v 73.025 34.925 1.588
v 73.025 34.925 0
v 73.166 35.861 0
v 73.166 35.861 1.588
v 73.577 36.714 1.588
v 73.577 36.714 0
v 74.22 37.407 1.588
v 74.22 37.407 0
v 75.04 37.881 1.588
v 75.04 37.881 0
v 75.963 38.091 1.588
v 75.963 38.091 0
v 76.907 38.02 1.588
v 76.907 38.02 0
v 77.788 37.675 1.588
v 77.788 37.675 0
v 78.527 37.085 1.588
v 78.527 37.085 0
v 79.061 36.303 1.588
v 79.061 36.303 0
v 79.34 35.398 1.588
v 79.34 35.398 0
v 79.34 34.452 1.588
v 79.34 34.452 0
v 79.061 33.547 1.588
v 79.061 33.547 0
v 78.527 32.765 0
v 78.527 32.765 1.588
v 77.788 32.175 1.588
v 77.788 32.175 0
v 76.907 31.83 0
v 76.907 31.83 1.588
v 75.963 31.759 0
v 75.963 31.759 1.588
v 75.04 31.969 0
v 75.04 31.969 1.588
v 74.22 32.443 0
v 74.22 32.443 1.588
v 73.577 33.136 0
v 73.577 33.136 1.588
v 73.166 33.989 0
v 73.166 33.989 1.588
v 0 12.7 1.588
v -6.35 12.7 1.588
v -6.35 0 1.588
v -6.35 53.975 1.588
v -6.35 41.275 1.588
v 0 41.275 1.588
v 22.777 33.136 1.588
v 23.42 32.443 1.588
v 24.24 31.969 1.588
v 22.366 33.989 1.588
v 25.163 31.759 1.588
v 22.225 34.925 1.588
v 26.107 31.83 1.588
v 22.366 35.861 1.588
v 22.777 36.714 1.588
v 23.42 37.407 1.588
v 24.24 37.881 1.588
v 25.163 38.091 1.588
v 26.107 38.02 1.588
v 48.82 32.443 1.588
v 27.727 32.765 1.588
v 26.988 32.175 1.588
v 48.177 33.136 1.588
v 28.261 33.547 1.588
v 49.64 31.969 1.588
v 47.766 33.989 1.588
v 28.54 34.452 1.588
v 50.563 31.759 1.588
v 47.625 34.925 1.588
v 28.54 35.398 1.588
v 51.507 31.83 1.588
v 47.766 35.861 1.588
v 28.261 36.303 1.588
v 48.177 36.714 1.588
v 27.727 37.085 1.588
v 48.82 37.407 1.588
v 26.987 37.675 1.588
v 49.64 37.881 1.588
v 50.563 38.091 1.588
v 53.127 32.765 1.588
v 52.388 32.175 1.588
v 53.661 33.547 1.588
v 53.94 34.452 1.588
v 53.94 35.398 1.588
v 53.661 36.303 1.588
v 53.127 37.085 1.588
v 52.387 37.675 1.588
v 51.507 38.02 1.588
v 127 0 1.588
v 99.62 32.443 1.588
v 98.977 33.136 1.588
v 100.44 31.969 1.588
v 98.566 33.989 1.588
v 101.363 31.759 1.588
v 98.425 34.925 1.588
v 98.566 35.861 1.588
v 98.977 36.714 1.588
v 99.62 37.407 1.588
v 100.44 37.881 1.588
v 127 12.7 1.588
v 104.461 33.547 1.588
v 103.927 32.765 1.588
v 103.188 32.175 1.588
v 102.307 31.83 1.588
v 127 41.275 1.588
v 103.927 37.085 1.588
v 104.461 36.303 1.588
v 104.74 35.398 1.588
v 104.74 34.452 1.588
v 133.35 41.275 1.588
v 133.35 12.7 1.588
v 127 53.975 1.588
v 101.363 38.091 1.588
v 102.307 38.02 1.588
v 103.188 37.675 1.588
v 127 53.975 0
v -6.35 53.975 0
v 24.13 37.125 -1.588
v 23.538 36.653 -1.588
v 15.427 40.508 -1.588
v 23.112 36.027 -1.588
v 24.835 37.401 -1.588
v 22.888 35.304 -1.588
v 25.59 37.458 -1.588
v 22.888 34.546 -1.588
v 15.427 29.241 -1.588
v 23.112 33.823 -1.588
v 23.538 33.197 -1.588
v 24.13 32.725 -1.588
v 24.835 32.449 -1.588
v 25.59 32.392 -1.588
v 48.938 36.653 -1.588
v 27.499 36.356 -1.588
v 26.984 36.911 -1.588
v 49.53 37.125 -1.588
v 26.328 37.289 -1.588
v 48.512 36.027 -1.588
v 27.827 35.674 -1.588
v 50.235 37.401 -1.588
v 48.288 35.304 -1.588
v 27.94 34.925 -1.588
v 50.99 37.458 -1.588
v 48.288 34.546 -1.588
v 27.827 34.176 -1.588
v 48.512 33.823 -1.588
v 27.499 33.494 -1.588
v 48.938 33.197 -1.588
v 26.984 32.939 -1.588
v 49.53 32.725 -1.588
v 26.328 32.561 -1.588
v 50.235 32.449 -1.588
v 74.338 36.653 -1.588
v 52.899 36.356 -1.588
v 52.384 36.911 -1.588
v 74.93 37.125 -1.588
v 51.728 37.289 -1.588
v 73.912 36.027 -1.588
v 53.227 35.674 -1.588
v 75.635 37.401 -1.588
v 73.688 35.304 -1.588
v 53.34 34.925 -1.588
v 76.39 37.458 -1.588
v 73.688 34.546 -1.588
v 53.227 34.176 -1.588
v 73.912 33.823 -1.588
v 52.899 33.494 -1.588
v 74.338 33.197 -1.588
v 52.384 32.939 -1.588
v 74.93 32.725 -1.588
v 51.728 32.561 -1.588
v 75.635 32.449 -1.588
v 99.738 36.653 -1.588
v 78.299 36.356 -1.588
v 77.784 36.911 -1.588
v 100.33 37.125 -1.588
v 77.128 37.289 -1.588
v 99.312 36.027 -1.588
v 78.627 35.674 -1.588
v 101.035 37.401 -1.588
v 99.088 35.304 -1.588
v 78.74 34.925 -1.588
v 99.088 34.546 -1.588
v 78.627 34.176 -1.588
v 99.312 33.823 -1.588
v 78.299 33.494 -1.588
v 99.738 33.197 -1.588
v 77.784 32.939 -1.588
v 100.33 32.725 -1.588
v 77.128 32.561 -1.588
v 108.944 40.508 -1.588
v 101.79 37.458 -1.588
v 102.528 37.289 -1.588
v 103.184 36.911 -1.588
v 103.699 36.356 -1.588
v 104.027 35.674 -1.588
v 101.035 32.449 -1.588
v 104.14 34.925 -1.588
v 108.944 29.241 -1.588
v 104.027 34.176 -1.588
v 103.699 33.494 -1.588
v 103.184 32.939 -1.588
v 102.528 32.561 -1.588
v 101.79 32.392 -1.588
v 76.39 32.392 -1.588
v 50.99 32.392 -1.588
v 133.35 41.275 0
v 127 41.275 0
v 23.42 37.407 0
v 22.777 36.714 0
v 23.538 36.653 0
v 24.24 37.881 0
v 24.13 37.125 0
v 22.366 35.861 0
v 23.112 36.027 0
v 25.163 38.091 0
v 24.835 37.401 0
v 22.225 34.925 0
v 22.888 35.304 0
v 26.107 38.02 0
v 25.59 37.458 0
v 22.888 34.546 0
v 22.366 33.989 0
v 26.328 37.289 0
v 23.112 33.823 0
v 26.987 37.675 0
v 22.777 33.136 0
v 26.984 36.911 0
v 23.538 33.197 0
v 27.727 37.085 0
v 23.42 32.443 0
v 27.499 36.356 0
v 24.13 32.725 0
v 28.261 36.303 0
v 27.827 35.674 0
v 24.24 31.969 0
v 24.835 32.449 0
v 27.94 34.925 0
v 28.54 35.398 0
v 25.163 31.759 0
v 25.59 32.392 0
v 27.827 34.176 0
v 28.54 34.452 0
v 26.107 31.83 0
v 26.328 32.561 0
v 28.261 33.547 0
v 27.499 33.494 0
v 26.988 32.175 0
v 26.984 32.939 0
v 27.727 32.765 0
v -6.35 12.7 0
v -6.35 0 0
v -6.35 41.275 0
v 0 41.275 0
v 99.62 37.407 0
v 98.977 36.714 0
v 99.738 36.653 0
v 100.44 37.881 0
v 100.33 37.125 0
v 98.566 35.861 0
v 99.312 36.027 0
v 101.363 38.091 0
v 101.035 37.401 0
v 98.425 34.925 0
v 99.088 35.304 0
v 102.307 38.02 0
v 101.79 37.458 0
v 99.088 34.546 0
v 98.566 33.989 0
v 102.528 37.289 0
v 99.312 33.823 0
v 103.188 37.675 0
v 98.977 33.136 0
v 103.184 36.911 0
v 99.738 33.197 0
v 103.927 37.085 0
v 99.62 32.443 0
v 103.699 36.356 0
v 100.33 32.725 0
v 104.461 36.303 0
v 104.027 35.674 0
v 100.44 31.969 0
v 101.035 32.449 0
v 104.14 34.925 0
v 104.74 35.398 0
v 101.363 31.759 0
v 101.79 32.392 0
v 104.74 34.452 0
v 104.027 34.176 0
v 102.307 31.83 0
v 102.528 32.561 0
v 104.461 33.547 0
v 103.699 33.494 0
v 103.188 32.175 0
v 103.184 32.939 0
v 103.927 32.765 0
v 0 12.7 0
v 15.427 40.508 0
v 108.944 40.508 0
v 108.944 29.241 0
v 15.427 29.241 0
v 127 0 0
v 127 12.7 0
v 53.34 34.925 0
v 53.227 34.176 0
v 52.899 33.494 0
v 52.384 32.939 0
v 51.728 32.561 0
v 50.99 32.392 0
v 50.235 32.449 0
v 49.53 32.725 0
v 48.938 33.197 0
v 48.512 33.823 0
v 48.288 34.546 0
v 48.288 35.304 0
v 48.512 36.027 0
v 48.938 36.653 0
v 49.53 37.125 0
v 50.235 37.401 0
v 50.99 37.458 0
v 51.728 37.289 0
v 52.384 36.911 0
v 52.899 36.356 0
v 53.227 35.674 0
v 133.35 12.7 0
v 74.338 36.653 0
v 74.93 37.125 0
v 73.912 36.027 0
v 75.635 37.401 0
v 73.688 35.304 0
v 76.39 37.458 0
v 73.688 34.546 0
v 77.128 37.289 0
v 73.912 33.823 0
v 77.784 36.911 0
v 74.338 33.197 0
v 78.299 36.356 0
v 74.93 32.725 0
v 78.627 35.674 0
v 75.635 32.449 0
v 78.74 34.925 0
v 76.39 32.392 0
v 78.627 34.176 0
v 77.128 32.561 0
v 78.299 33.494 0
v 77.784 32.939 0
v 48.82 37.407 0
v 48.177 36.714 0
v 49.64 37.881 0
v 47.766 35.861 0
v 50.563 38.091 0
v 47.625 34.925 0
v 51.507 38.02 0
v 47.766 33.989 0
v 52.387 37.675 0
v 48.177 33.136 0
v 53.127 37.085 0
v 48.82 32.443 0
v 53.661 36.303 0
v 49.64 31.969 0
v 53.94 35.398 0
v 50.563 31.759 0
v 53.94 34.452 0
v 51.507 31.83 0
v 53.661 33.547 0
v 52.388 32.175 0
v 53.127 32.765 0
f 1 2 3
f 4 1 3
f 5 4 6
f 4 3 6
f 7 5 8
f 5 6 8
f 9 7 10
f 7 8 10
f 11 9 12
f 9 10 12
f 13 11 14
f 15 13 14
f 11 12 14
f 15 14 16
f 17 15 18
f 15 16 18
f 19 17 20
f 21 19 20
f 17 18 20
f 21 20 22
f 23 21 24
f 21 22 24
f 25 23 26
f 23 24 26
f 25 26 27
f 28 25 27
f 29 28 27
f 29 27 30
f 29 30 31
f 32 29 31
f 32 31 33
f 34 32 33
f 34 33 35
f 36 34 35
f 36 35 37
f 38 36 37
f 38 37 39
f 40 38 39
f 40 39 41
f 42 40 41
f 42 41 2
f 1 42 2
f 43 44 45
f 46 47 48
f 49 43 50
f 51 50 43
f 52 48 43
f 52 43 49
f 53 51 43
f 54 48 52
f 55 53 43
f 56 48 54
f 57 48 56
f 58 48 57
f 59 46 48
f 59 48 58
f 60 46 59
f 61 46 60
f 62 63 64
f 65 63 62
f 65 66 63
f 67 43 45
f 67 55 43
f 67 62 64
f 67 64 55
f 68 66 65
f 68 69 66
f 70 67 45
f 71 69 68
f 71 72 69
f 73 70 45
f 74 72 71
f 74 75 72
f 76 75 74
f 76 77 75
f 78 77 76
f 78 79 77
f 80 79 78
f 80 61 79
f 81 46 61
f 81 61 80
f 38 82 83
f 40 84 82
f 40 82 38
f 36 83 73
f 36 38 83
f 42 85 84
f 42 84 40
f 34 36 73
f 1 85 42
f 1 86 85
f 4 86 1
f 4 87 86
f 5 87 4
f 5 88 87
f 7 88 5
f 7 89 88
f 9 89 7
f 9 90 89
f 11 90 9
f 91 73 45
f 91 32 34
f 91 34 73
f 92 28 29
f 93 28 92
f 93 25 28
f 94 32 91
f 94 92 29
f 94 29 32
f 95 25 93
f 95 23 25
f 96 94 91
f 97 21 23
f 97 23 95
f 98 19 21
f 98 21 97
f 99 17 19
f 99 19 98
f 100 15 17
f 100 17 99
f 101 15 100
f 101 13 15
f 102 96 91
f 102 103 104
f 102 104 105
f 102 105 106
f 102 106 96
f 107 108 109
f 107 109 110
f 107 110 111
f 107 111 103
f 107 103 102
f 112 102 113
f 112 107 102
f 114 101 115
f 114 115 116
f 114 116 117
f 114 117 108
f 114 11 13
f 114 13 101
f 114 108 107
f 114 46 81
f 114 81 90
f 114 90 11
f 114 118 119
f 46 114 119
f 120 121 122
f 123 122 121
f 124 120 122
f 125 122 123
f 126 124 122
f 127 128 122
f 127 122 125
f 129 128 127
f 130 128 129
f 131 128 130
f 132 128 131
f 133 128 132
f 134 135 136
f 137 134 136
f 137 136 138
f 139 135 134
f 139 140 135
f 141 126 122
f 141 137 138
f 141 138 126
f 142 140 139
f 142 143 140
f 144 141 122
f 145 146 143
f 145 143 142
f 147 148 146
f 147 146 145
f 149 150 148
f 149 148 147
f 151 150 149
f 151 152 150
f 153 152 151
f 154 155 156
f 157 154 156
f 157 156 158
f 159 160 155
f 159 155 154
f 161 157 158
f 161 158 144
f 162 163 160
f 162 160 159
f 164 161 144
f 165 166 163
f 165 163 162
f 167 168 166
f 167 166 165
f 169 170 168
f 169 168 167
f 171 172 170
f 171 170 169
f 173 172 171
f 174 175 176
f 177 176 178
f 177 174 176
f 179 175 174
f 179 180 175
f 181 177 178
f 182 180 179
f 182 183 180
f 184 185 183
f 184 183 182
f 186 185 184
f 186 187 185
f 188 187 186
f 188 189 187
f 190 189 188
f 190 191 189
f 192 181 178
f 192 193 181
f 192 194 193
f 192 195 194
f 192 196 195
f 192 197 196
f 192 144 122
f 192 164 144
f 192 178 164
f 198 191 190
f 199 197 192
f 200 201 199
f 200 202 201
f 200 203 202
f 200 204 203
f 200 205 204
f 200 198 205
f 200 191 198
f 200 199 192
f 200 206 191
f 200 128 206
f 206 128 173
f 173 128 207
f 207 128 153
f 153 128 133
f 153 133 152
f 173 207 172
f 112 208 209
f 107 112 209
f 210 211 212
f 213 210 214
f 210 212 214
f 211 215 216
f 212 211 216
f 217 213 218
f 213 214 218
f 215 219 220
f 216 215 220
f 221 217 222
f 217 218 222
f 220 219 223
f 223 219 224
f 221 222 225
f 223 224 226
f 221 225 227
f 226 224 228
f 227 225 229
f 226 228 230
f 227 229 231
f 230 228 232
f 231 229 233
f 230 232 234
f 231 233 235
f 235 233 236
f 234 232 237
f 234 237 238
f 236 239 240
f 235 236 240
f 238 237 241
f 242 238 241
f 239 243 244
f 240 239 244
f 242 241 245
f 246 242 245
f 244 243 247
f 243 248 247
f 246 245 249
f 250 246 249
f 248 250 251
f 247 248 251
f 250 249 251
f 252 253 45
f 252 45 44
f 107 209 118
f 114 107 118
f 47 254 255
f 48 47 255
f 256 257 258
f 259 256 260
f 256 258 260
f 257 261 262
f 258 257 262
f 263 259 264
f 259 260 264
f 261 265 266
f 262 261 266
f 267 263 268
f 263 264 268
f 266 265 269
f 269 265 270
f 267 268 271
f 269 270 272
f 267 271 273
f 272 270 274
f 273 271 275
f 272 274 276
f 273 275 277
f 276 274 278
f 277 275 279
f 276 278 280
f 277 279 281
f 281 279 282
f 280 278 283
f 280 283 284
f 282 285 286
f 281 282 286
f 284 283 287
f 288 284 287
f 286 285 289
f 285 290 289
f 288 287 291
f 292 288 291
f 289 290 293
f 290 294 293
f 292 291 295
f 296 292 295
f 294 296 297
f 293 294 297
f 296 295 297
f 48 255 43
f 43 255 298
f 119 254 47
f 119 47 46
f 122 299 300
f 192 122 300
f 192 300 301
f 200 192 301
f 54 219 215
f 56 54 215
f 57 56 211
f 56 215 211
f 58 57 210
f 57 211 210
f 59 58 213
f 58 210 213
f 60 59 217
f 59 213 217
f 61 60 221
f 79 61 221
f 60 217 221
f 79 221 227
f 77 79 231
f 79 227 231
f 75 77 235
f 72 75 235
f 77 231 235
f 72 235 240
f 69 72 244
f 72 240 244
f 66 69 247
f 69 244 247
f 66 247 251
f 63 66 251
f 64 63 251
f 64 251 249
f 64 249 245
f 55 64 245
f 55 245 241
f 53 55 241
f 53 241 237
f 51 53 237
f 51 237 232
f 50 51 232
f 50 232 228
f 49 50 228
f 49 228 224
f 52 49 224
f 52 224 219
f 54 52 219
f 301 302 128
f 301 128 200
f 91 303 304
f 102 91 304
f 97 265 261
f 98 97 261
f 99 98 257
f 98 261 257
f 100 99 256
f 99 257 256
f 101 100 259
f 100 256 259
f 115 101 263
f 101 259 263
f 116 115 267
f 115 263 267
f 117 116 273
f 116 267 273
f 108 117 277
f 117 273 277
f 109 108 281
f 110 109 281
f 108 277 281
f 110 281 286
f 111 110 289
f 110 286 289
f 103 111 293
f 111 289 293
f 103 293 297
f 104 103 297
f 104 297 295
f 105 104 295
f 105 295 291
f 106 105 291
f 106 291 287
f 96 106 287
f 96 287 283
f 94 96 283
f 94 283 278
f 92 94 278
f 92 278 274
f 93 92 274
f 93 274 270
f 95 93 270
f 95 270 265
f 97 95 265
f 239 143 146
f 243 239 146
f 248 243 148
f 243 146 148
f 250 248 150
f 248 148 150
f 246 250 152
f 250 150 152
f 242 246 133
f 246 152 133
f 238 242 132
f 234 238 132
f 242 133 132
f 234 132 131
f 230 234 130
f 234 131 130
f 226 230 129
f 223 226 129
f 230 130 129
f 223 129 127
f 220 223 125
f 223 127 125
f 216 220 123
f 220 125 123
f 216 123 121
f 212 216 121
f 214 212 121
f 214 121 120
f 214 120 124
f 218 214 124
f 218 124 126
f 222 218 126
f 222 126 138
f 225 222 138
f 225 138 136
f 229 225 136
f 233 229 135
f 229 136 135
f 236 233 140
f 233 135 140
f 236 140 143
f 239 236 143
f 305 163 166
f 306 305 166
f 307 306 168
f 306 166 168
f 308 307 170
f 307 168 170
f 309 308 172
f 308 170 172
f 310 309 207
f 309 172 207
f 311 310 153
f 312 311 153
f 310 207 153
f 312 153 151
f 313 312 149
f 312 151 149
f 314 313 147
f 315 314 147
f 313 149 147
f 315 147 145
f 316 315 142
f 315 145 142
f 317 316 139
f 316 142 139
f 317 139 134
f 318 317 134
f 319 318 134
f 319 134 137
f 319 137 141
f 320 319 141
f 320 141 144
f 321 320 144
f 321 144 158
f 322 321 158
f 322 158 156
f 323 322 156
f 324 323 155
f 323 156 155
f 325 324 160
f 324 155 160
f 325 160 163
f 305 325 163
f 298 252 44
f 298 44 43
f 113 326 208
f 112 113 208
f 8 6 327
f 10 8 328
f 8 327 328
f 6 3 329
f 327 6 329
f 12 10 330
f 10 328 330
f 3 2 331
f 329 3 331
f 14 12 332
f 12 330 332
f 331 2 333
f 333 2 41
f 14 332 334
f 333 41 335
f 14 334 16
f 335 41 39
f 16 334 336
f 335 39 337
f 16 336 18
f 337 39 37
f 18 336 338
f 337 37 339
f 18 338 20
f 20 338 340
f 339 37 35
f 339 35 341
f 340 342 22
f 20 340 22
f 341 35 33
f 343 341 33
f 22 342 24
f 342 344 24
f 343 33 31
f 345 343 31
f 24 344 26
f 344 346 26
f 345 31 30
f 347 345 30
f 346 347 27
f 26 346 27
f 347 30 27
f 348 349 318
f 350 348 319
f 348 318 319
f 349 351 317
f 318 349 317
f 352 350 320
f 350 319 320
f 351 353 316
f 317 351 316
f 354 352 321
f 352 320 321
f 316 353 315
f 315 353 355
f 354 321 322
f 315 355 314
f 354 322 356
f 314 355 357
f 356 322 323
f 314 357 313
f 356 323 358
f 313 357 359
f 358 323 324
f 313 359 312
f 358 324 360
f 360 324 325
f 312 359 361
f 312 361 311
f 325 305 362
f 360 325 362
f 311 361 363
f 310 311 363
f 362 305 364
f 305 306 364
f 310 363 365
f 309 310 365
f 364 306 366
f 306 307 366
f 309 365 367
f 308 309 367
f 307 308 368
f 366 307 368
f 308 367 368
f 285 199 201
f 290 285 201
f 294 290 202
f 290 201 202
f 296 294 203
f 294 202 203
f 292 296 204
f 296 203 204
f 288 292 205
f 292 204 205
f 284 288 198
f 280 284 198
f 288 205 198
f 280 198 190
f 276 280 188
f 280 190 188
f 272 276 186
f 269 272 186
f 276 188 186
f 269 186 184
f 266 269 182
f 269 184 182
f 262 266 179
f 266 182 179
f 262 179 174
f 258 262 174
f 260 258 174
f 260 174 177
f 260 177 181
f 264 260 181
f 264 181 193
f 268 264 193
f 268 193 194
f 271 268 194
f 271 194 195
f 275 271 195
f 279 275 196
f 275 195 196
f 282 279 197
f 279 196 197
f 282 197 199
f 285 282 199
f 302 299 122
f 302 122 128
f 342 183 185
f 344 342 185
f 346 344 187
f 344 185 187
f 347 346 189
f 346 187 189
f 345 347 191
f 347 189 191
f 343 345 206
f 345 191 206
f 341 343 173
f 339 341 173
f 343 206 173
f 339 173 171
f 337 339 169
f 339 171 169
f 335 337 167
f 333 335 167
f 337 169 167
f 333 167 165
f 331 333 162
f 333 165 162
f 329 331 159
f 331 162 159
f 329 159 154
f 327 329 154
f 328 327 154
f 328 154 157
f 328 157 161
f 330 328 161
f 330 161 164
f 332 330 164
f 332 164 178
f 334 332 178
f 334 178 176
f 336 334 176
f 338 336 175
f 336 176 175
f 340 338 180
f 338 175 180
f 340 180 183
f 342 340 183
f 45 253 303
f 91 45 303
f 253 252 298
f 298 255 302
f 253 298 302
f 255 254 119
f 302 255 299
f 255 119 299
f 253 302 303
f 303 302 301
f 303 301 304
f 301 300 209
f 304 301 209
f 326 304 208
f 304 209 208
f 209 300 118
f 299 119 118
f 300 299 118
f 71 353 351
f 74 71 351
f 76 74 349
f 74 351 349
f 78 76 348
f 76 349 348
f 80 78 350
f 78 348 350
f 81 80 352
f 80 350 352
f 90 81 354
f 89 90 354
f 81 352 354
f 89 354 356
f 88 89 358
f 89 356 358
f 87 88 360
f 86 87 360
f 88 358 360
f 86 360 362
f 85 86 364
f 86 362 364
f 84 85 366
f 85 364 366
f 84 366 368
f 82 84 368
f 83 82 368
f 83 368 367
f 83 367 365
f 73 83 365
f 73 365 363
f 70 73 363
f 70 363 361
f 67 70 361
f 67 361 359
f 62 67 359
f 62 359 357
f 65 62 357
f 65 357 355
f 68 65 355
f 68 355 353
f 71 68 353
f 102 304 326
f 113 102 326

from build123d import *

# Parameters (mm, degrees)
F0_W     = 6.35
F0_H     = 12.7
F1_DEPTH = 1.5875
F2_W     = 93.517256
F2_H     = 11.267142
F2_R     = 3.175
F3_DEPTH = 1.5875
F4_R     = 3.175
F4_R_2   = 2.54
F5_DEPTH = 1.5875


with BuildPart() as f1:
    # F0 (on Top) → F1 (new body)
    with BuildSketch(Plane.XY):
        with BuildLine():
            Line((0, 12.7), (0, 0))
            Line((0, 0), (127, 0))
            Line((127, 0), (127, 12.7))
            Line((127, 12.7), (127, 34.925))
            Line((127, 34.925), (104.775, 34.925))
            ThreePointArc((104.775, 34.925), (101.6, 31.75), (98.425, 34.925))
            Line((98.425, 34.925), (79.375, 34.925))
            ThreePointArc((79.375, 34.925), (76.2, 31.75), (73.025, 34.925))
            Line((73.025, 34.925), (53.975, 34.925))
            ThreePointArc((53.975, 34.925), (50.8, 31.75), (47.625, 34.925))
            Line((47.625, 34.925), (28.575, 34.925))
            ThreePointArc((28.575, 34.925), (25.4, 31.75), (22.225, 34.925))
            Line((22.225, 34.925), (0, 34.925))
            Line((0, 34.925), (0, 12.7))
        make_face()
        with Locations((-3.175, 6.35)):
            Rectangle(F0_W, F0_H)
        with Locations((-3.175, 47.625)):
            Rectangle(F0_W, F0_H)
        with BuildLine():
            Line((0, 41.275), (0, 34.925))
            Line((0, 34.925), (22.225, 34.925))
            ThreePointArc((22.225, 34.925), (25.4, 38.1), (28.575, 34.925))
            Line((28.575, 34.925), (47.625, 34.925))
            ThreePointArc((47.625, 34.925), (50.8, 38.1), (53.975, 34.925))
            Line((53.975, 34.925), (73.025, 34.925))
            ThreePointArc((73.025, 34.925), (76.2, 38.1), (79.375, 34.925))
            Line((79.375, 34.925), (98.425, 34.925))
            ThreePointArc((98.425, 34.925), (101.6, 38.1), (104.775, 34.925))
            Line((104.775, 34.925), (127, 34.925))
            Line((127, 34.925), (127, 41.275))
            Line((127, 41.275), (127, 53.975))
            Line((127, 53.975), (0, 53.975))
            Line((0, 53.975), (0, 41.275))
        make_face()
        Polygon((127, 34.925), (127, 12.7), (133.35, 12.7), (133.35, 41.275), (127, 41.275), align=None)
    extrude(amount=F1_DEPTH)

    # F2 (on face) → F3 (join)
    with BuildSketch(Plane(origin=(0, 0, 0), x_dir=(1, 0, 0), z_dir=(0, 0, -1))):
        with Locations((62.18549, -34.874498)):
            Rectangle(F2_W, F2_H)
        with Locations((25.4, -34.925)):
            Circle(F2_R, mode=Mode.SUBTRACT)
        with Locations((50.8, -34.925)):
            Circle(F2_R, mode=Mode.SUBTRACT)
        with Locations((76.2, -34.925)):
            Circle(F2_R, mode=Mode.SUBTRACT)
        with Locations((101.6, -34.925)):
            Circle(F2_R, mode=Mode.SUBTRACT)
    extrude(amount=F3_DEPTH)

    # F4 (on face) → F5 (join)
    with BuildSketch(Plane(origin=(0, 0, -1.5875), x_dir=(1, 0, 0), z_dir=(0, 0, -1))):
        with Locations((101.6, -34.925)):
            Circle(F4_R)
        with Locations((101.6, -34.925)):
            Circle(F4_R_2, mode=Mode.SUBTRACT)
        with Locations((76.2, -34.925)):
            Circle(F4_R)
        with Locations((76.2, -34.925)):
            Circle(F4_R_2, mode=Mode.SUBTRACT)
        with Locations((50.8, -34.925)):
            Circle(F4_R)
        with Locations((50.8, -34.925)):
            Circle(F4_R_2, mode=Mode.SUBTRACT)
        with Locations((25.4, -34.925)):
            Circle(F4_R)
        with Locations((25.4, -34.925)):
            Circle(F4_R_2, mode=Mode.SUBTRACT)
    extrude(amount=-F5_DEPTH)


solid = f1.part
